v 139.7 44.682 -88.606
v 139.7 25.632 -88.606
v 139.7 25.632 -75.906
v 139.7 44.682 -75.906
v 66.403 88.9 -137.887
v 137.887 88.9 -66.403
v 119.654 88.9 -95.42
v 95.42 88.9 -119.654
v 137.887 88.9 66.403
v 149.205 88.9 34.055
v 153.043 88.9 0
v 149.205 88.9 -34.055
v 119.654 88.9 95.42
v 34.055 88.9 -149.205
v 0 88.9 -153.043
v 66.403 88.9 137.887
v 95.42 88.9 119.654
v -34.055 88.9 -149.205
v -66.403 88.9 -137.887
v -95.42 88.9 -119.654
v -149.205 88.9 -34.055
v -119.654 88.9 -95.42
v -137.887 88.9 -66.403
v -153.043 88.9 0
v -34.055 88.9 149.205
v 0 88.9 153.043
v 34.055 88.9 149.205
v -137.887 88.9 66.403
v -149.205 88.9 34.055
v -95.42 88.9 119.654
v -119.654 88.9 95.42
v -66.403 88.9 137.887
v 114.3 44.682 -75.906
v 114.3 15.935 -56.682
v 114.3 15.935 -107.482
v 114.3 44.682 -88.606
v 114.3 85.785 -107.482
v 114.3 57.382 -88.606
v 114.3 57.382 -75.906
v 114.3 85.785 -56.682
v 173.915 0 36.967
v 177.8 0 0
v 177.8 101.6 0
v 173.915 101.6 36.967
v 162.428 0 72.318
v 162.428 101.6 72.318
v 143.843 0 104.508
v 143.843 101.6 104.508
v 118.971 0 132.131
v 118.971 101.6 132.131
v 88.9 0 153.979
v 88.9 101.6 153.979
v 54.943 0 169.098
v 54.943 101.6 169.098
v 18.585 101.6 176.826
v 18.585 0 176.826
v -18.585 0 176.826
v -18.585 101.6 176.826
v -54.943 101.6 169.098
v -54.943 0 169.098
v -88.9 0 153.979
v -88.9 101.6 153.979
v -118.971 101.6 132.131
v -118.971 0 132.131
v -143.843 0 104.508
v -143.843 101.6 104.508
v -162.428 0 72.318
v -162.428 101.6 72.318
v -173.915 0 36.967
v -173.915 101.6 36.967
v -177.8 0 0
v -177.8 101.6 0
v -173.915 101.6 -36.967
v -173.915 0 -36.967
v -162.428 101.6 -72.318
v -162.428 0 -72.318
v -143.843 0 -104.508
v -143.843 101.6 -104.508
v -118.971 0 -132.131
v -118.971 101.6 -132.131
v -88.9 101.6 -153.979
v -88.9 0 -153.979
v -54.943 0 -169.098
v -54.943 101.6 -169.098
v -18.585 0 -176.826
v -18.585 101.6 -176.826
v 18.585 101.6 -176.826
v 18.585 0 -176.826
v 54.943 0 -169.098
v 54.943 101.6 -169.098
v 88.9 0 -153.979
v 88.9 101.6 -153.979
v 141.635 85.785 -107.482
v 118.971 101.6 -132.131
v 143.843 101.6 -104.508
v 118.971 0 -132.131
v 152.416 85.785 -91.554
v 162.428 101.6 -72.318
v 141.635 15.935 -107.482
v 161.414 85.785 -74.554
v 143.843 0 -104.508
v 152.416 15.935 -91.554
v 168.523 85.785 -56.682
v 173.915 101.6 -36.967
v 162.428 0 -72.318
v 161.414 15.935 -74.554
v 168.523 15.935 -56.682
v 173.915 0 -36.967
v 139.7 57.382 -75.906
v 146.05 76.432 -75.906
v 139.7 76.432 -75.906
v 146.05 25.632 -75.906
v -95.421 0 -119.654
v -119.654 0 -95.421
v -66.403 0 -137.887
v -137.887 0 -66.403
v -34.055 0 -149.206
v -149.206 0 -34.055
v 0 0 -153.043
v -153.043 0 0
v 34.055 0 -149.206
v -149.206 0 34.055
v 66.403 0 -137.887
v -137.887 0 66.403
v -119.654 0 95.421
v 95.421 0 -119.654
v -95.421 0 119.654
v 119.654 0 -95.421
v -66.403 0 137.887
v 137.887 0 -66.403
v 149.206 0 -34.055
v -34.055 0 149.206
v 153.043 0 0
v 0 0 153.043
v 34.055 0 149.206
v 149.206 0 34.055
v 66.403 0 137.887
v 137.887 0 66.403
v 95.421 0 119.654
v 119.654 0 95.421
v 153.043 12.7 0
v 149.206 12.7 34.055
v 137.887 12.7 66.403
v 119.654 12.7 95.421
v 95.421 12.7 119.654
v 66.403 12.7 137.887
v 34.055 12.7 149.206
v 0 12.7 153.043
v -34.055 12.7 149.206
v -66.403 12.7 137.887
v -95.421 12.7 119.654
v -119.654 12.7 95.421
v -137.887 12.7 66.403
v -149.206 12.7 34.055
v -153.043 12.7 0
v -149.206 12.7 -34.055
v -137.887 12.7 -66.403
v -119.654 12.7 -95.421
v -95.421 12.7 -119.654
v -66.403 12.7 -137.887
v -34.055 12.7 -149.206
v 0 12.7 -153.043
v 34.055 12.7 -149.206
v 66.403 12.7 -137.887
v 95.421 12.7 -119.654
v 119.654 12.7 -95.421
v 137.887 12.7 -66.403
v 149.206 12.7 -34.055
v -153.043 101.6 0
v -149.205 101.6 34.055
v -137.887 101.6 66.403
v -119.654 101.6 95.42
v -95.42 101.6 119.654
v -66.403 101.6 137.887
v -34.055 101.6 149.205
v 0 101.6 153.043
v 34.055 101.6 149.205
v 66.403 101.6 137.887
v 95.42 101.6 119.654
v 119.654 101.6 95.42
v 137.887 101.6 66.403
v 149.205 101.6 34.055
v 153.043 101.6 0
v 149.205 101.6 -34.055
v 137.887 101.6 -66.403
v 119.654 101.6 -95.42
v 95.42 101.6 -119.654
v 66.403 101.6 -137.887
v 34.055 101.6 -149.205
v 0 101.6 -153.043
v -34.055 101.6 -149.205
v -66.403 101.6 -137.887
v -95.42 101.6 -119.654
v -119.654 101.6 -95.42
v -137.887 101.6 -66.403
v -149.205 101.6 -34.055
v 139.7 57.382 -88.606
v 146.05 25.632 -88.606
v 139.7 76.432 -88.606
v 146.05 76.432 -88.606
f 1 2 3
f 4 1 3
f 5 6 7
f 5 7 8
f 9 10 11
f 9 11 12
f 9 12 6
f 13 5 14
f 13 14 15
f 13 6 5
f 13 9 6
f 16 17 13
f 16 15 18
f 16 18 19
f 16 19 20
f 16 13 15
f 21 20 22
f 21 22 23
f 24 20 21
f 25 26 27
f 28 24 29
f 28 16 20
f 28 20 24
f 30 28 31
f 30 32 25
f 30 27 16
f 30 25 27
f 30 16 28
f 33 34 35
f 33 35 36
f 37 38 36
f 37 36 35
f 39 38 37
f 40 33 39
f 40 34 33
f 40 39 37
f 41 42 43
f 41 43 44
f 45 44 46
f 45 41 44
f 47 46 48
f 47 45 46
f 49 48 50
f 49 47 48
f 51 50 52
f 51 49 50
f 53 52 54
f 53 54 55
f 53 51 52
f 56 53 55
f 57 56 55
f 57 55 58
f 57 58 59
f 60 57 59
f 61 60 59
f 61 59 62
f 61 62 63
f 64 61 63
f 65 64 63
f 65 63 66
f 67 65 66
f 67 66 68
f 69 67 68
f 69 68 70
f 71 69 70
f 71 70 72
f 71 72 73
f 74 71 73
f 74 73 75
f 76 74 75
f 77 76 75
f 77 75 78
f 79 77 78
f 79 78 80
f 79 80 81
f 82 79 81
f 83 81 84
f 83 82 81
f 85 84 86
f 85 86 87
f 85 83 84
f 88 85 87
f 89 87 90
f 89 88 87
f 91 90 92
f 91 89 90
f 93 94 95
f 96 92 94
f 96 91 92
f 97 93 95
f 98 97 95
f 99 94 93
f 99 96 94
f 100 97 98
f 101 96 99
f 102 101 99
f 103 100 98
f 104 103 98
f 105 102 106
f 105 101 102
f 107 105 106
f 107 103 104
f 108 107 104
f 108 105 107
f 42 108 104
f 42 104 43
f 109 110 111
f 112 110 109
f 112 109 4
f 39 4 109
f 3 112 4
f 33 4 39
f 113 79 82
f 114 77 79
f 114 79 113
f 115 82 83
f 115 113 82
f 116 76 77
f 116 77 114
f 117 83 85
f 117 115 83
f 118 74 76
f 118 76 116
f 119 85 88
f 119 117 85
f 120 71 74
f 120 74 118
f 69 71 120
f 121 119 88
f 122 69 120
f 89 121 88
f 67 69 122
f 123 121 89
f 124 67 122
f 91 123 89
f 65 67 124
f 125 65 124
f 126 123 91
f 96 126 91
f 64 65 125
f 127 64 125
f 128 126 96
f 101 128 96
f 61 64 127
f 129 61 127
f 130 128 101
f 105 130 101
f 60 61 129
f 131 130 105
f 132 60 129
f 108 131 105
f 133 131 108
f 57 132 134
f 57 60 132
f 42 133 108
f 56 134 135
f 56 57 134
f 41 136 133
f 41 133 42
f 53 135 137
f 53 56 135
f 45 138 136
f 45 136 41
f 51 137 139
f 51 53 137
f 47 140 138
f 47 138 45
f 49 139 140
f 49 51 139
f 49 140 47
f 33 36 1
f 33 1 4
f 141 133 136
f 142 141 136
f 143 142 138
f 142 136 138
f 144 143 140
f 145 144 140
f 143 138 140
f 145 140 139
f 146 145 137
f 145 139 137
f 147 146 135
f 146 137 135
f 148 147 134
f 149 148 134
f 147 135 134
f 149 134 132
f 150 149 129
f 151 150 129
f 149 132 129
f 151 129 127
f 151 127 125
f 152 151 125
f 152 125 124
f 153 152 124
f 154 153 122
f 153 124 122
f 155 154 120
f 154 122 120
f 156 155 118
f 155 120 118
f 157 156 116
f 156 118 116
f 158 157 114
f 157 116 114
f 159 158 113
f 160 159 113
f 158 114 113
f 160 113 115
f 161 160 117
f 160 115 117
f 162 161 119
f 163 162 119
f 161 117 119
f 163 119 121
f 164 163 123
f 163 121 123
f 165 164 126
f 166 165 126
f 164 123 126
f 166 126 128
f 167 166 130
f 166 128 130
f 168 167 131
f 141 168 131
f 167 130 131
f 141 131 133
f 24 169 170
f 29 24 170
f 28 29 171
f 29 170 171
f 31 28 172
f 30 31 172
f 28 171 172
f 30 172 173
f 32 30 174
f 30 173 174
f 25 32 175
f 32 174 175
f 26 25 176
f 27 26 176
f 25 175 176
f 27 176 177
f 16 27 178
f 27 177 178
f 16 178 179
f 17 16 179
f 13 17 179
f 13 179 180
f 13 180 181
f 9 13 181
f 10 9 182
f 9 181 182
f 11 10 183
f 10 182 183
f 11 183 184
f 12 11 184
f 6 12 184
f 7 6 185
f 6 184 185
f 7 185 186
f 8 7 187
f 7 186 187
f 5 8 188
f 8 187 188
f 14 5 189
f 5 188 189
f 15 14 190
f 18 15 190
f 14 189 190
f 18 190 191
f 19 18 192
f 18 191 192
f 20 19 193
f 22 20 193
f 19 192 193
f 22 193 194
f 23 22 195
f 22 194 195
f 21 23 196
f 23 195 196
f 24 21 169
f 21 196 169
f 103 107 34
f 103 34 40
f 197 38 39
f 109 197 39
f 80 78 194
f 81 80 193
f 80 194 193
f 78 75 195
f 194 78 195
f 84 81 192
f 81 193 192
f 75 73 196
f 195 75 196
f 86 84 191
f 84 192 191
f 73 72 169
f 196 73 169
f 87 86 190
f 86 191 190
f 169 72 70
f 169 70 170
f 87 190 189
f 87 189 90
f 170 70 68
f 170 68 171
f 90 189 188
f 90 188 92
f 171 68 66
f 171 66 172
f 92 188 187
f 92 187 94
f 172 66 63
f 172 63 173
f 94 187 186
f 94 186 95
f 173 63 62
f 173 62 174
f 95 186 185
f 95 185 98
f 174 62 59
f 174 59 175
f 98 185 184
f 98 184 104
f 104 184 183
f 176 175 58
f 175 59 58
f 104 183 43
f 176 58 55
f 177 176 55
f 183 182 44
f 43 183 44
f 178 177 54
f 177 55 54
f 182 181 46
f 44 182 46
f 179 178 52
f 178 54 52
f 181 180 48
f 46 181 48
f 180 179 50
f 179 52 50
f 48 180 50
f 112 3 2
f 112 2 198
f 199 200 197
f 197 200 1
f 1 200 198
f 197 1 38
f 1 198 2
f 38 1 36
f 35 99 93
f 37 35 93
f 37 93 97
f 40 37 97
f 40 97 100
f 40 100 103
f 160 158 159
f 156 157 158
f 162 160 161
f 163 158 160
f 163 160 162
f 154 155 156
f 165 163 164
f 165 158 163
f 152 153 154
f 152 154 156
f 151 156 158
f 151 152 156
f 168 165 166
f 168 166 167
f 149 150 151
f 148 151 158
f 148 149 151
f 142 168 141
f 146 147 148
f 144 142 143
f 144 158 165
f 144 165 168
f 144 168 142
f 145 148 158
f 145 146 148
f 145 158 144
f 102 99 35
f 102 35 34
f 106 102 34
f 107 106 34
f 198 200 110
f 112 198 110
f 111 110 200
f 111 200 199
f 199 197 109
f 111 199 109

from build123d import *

# Parameters (mm, degrees)
F0_R      = 177.8
F1_DEPTH  = 101.6
F2_R      = 153.042574
F3_DEPTH  = 12.7
F4_R      = 153.04262
F5_DEPTH  = 12.7
F7_W      = 69.85
F7_H      = 50.8
F8_DEPTH  = 63.5
F10_W     = 12.7
F10_H     = 12.7
F11_DEPTH = 31.75
F12_W     = 6.35
F12_H     = 12.7
F13_DEPTH = 19.05
F14_W     = 6.35
F14_H     = 12.7
F15_DEPTH = 19.05


with BuildPart() as f1:
    # F0 (on Front) → F1 (new body)
    with BuildSketch(Plane.XZ):
        Circle(F0_R)
    extrude(amount=-F1_DEPTH)

    # F2 (on face) → F3 (cut)
    with BuildSketch(Plane(origin=(0, 101.6, 0), x_dir=(-1, 0, 0), z_dir=(0, 1, 0))):
        Circle(F2_R)
    extrude(amount=-F3_DEPTH, mode=Mode.SUBTRACT)

    # F4 (on face) → F5 (cut)
    with BuildSketch(Plane.XZ):
        Circle(F4_R)
    extrude(amount=-F5_DEPTH, mode=Mode.SUBTRACT)

    # F7 (on offset) → F8 (cut)
    with BuildSketch(Plane.YZ.offset(177.8)):
        with Locations((50.85966, -82.082137)):
            Rectangle(F7_W, F7_H)
    extrude(amount=-F8_DEPTH, mode=Mode.SUBTRACT)

    # F10 (on offset) → F11 (join)
    with BuildSketch(Plane.YZ.offset(114.3)):
        with Locations((51.032025, -82.255941)):
            Rectangle(F10_W, F10_H)
    extrude(amount=F11_DEPTH)

    # F12 (on face) → F13 (join)
    with BuildSketch(Plane.XZ.offset(-44.682025)):
        with Locations((142.875, -82.255941)):
            Rectangle(F12_W, F12_H)
    extrude(amount=F13_DEPTH)

    # F14 (on face) → F15 (join)
    with BuildSketch(Plane(origin=(0, 57.382025, 0), x_dir=(-1, 0, 0), z_dir=(0, 1, 0))):
        with Locations((-142.875, -82.255941)):
            Rectangle(F14_W, F14_H)
    extrude(amount=F15_DEPTH)


solid = f1.part
